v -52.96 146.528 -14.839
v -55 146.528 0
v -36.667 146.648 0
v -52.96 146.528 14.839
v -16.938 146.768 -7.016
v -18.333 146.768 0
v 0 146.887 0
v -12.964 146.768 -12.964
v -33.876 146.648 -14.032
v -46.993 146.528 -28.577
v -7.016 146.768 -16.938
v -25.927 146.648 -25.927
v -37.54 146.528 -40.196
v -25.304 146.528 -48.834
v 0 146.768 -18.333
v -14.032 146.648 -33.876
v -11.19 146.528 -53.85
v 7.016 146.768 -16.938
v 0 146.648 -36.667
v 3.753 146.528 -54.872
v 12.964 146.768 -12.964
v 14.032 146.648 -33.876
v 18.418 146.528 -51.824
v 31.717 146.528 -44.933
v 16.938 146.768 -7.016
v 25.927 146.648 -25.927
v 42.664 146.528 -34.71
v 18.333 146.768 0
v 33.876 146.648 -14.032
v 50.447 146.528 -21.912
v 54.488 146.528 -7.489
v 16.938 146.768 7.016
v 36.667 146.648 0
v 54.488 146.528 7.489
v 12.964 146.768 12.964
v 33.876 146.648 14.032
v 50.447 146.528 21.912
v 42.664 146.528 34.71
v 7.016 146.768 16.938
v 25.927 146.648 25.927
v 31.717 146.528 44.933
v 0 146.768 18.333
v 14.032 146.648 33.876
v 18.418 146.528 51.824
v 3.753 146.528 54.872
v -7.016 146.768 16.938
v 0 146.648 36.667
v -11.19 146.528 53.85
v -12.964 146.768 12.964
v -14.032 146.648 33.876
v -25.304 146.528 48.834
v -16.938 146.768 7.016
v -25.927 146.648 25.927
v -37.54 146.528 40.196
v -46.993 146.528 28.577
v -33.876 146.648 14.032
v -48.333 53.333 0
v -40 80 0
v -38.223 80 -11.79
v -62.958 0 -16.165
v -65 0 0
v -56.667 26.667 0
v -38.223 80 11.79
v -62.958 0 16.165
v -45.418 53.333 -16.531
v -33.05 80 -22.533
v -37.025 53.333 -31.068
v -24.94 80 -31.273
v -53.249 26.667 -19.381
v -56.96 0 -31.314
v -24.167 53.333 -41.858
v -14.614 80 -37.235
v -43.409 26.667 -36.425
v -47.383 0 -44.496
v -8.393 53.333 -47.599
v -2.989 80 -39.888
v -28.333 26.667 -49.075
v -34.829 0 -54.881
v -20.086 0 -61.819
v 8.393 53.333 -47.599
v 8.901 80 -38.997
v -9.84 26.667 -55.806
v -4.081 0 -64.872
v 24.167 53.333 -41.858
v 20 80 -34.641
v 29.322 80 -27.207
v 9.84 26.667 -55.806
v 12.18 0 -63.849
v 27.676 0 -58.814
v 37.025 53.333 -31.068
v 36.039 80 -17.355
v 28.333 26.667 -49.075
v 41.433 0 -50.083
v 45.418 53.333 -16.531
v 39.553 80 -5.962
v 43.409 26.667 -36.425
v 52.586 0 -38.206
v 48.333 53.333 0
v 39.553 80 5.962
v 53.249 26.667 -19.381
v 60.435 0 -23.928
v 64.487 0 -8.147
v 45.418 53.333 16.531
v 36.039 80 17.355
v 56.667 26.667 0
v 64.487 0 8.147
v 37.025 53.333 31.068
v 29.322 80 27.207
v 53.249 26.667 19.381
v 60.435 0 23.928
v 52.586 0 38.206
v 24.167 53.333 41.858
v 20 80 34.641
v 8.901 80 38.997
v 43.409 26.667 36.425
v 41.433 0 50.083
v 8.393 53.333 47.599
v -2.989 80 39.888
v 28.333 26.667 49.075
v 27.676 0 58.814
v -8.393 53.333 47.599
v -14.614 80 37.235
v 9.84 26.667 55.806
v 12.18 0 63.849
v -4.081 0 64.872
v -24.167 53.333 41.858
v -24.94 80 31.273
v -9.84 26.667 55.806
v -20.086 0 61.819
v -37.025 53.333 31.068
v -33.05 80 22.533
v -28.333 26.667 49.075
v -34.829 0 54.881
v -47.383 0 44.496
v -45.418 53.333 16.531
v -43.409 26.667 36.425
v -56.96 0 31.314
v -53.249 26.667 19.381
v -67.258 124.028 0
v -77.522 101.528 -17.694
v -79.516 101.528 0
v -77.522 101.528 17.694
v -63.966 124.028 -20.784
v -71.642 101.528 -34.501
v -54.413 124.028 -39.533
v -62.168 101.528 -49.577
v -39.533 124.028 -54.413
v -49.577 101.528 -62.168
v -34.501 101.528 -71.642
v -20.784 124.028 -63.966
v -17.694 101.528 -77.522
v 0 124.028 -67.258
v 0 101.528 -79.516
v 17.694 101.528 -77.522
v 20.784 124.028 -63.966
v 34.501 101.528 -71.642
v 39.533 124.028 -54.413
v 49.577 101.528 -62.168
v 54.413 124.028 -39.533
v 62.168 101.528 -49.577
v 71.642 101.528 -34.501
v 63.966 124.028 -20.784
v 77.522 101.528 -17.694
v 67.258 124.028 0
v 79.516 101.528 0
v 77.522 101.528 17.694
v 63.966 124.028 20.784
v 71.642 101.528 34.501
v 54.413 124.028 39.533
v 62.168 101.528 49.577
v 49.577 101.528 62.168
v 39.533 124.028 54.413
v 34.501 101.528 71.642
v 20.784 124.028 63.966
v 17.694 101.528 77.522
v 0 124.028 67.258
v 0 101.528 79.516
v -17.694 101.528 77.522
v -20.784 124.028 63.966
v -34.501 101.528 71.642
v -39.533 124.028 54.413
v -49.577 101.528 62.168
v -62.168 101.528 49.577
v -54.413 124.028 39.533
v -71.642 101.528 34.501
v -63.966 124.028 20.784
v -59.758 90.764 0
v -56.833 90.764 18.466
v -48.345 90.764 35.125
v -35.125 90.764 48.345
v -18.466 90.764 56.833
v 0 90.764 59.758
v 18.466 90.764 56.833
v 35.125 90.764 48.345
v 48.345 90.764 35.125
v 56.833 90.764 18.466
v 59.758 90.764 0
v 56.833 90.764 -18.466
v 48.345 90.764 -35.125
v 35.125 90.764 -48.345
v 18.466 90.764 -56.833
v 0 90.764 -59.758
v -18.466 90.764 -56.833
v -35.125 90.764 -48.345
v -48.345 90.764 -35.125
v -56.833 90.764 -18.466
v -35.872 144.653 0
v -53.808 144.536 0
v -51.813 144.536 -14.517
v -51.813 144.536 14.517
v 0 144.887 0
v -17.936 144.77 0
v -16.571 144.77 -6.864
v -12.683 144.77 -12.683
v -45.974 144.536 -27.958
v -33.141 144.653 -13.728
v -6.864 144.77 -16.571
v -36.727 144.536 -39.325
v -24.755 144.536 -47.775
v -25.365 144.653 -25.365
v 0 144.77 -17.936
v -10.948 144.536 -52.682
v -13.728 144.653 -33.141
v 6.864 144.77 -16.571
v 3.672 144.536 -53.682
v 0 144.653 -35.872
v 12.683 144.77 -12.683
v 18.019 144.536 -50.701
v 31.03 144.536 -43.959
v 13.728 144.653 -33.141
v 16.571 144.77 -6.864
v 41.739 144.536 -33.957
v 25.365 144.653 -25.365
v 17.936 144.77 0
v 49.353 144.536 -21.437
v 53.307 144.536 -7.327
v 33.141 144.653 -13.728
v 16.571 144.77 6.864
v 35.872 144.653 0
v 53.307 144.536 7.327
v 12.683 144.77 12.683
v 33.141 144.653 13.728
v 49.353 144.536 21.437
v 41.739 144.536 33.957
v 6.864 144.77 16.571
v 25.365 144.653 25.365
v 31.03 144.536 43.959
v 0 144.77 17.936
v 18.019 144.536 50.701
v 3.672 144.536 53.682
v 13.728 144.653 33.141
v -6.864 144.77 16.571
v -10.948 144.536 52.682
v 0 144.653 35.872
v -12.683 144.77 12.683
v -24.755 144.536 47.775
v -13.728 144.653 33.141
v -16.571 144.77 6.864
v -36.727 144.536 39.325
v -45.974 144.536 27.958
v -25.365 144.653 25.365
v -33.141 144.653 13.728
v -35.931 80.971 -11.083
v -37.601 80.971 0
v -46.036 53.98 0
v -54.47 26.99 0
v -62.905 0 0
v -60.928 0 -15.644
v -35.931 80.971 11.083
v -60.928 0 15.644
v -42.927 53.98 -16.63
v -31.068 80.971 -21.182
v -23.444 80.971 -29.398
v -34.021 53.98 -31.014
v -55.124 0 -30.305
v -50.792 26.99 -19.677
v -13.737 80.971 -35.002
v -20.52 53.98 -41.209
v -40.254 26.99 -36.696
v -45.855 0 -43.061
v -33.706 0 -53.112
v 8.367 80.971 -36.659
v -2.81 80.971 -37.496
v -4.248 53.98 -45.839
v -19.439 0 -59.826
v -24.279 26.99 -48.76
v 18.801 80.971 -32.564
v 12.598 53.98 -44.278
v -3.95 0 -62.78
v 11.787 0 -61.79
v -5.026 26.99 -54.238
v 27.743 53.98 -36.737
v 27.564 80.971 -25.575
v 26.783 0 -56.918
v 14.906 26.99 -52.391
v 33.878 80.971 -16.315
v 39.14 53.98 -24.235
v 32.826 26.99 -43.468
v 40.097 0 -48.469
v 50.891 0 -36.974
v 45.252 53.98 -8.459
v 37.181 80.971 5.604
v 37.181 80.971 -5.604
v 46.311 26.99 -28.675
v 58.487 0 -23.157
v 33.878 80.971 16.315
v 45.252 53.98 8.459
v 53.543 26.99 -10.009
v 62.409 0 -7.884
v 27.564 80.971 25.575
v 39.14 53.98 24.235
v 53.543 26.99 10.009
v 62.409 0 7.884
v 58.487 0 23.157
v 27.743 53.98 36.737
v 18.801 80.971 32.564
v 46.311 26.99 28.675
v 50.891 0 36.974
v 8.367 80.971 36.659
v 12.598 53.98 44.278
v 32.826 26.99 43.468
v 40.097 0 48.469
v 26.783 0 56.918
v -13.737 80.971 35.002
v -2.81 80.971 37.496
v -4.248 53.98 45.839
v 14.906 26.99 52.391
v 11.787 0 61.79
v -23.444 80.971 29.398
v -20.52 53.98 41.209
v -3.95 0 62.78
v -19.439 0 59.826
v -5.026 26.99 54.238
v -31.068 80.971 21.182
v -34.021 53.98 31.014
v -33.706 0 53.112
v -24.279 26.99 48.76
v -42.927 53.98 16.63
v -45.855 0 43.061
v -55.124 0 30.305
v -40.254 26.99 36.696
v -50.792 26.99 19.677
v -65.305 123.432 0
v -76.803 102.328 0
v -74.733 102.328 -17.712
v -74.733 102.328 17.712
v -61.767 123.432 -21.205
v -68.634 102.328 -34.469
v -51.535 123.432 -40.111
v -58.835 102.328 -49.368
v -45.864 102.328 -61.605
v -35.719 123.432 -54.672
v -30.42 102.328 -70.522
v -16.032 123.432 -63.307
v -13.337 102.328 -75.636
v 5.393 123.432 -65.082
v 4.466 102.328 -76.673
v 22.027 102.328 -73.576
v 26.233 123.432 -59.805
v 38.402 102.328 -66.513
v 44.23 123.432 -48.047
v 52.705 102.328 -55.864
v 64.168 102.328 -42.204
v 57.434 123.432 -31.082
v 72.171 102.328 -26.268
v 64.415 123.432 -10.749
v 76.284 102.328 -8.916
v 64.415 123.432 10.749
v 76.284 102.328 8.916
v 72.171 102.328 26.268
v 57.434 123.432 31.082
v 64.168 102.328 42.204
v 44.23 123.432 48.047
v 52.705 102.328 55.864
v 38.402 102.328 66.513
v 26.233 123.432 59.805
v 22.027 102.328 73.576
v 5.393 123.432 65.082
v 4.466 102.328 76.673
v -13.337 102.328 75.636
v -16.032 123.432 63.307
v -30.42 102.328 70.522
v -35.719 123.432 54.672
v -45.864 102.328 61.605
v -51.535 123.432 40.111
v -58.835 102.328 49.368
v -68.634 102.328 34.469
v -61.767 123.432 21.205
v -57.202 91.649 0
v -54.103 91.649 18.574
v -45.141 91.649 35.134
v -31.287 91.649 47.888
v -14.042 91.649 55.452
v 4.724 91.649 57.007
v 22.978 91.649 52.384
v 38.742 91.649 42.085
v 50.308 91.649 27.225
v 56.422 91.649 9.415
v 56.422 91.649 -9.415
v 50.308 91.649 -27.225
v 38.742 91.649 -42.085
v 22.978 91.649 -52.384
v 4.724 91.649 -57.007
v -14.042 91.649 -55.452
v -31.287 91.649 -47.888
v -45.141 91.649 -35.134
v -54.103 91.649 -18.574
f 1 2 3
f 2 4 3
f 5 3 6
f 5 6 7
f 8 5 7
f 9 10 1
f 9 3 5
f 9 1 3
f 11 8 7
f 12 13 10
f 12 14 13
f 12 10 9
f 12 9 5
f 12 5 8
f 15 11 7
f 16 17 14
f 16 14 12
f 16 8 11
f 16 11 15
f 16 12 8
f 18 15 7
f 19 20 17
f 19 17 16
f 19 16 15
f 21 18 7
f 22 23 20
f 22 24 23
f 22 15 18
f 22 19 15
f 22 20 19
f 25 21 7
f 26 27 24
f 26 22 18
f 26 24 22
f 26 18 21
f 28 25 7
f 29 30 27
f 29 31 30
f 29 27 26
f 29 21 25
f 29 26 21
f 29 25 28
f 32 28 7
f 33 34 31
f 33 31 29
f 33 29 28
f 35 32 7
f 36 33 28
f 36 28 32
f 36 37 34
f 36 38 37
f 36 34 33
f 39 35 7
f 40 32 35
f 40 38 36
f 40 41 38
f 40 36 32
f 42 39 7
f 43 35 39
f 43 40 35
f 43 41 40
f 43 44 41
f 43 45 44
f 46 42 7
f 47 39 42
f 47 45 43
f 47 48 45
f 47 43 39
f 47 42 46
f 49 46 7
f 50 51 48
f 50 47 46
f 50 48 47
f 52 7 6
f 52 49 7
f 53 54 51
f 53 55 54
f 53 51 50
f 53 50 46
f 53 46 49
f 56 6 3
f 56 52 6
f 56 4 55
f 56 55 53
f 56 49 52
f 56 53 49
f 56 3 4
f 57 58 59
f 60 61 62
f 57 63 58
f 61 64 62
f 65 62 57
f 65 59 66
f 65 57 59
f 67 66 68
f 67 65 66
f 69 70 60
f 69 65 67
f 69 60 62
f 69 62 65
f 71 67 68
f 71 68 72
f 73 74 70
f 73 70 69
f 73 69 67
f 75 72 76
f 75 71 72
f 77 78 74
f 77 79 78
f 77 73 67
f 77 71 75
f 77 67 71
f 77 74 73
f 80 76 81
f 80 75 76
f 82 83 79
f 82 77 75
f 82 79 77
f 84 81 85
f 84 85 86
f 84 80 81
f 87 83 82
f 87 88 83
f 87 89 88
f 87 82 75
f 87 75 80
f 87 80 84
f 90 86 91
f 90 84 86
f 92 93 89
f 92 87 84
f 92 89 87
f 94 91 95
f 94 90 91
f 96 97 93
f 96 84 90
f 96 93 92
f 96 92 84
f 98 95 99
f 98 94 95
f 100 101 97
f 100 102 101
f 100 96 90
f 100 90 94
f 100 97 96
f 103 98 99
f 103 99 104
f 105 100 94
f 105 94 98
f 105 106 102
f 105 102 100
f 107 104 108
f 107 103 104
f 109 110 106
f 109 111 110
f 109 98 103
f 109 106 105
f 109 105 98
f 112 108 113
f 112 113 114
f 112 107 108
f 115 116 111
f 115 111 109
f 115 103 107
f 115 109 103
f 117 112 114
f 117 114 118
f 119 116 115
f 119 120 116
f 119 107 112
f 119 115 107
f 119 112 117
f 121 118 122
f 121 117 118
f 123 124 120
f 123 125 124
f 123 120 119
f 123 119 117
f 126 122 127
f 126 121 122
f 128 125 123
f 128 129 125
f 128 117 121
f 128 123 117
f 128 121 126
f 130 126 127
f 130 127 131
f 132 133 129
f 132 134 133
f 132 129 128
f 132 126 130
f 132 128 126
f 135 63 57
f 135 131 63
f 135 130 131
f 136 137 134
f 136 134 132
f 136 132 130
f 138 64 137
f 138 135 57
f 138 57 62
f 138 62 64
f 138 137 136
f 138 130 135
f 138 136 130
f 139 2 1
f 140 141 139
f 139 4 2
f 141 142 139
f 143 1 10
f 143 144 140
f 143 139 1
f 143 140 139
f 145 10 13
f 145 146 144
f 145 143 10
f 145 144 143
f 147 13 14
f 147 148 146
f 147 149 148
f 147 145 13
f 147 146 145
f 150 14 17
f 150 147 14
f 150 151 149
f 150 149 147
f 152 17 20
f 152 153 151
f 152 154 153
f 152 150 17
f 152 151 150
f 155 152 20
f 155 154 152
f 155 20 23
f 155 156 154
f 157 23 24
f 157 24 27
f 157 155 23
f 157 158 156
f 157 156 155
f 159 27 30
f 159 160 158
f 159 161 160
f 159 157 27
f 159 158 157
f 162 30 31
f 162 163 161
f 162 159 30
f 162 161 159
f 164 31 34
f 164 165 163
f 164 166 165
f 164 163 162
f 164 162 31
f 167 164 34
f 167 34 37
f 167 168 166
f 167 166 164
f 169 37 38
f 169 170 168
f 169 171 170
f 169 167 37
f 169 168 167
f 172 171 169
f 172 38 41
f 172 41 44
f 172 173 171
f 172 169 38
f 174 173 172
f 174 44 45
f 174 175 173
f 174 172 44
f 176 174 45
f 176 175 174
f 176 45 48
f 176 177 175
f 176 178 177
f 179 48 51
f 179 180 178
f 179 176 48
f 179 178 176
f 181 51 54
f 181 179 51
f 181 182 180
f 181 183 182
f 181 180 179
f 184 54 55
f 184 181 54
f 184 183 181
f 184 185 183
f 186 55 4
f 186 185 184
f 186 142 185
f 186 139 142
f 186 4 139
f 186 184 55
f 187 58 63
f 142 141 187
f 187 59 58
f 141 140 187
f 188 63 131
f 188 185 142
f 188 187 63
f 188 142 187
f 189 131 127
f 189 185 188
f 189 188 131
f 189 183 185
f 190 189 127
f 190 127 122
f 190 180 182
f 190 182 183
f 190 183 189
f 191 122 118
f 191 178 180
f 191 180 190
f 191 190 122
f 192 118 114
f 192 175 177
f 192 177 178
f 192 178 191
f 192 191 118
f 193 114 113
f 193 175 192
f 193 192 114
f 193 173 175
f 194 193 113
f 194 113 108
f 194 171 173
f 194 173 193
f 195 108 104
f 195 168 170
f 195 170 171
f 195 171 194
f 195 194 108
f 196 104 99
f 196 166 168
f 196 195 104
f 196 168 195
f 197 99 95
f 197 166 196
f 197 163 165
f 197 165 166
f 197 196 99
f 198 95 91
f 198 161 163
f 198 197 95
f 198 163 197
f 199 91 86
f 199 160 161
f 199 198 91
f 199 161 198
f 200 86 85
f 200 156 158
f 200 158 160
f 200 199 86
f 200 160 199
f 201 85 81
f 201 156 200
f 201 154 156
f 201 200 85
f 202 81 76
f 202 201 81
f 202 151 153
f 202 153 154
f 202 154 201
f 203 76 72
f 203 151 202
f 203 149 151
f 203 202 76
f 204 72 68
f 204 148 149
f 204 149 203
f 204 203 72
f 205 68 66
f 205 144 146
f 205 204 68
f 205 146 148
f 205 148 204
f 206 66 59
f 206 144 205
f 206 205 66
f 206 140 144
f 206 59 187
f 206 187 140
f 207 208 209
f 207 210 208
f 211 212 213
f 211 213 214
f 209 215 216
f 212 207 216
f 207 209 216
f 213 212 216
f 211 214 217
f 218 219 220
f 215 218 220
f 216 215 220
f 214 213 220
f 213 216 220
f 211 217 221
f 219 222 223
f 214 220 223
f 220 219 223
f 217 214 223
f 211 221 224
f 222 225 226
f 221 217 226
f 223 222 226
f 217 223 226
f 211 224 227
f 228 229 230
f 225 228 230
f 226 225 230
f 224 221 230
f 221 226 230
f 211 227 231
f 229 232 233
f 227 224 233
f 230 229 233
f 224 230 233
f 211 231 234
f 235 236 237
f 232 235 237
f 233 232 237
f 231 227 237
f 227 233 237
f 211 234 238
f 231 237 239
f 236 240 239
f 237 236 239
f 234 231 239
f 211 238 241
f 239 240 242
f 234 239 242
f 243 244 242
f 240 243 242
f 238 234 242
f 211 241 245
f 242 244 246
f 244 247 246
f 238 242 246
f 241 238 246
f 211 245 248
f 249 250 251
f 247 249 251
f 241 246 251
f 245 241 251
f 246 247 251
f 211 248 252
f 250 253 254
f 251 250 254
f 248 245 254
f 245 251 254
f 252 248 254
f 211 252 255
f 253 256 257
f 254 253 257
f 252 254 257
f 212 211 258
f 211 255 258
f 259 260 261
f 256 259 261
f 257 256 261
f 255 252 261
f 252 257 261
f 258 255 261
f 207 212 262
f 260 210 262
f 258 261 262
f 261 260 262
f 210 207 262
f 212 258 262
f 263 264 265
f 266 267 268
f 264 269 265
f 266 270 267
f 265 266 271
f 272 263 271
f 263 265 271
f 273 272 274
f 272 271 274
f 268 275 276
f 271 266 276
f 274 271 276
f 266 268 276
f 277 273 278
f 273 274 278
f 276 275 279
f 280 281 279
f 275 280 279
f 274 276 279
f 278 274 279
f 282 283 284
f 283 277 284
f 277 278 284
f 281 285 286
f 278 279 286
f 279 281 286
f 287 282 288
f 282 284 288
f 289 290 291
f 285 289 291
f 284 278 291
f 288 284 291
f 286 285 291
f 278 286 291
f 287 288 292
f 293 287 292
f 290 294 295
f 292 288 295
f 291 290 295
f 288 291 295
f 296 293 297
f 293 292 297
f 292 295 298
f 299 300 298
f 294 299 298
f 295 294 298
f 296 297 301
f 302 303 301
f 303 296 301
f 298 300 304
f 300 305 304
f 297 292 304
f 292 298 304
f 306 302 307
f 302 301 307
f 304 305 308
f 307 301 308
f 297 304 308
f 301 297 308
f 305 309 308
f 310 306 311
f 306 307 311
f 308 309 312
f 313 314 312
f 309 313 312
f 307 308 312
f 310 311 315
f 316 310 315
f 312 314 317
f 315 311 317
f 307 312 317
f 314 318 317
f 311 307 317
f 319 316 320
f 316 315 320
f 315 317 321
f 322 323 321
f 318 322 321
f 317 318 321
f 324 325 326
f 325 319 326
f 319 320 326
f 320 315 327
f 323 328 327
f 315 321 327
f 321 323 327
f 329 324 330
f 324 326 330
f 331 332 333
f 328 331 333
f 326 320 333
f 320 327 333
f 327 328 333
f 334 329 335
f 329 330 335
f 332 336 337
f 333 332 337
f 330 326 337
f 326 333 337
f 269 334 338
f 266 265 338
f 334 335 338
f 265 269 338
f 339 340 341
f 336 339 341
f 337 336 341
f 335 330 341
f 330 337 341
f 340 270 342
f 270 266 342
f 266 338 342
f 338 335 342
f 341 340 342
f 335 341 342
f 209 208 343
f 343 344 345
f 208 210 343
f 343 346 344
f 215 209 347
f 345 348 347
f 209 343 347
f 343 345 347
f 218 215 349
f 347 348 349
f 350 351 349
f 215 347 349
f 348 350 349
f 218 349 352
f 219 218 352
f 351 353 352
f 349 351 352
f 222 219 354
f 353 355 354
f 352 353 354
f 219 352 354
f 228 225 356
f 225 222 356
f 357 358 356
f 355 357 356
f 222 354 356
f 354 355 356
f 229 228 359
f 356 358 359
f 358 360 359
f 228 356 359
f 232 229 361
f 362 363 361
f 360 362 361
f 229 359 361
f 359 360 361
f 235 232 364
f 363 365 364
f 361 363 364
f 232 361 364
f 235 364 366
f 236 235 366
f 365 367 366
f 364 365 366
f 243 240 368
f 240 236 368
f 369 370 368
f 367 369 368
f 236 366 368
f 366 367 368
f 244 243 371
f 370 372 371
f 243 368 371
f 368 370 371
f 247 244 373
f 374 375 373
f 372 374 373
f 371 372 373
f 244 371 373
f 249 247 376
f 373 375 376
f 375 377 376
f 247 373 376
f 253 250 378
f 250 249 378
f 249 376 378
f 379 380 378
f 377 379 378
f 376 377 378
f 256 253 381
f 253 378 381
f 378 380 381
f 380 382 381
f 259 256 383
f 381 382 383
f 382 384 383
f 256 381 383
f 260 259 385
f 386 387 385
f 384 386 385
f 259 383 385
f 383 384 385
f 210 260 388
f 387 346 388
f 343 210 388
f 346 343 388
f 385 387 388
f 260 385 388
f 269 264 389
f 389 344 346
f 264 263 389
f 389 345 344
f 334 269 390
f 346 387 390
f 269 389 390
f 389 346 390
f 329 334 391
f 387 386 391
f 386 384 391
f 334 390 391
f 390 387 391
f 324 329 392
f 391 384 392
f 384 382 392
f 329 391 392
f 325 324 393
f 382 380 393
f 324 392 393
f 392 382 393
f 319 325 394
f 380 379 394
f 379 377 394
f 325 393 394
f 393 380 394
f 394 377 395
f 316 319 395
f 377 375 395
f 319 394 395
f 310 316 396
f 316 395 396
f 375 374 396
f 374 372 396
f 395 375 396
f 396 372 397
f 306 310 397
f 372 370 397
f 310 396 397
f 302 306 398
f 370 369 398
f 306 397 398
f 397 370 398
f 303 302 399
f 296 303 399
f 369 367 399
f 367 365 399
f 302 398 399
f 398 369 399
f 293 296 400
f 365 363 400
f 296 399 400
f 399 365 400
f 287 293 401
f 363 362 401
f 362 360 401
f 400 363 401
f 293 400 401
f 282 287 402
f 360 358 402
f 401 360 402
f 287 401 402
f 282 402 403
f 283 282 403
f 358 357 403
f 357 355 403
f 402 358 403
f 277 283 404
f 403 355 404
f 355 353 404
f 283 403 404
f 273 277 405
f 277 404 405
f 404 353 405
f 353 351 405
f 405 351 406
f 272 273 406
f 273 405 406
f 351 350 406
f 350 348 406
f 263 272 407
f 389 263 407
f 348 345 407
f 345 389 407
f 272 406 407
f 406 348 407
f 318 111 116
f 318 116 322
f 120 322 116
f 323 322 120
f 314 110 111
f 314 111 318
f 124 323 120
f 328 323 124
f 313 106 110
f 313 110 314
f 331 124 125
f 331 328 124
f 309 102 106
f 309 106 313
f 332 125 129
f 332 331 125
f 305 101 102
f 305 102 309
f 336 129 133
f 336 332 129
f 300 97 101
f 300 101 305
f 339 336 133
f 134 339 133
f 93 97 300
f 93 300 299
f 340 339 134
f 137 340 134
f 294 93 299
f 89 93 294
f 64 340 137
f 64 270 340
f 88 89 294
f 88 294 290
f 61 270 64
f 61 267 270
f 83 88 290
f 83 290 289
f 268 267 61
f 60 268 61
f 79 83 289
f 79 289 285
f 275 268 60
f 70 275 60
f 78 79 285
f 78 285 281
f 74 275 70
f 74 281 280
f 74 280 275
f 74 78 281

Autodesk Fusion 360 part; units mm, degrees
sketch "Esquisse1" plane through (0, 0, 0) normal (0, 0, 1) x (1, 0, 0)
  line L0 (0, 0) -> (-65, 0)
  line L1 (-65, 0) -> (-40, 80)
  line L2 (-40, 80) -> (-79.5161, 101.5285)
  line L3 (-79.5161, 101.5285) -> (-55, 146.5285)
  line L4 (-55, 146.5285) -> (0, 146.8871)
  line L5 (0, 146.8871) -> (0, 0)
  dimension "d1" = 65
  dimension "d2" = 45
  dimension "d3" = 45
  dimension "d4" = 40
  dimension "d5" = 80
  dimension "d6" = 55
revolve "Révolution1" add sketch "Esquisse1" angle 360 about axis through (0, 146.8871, 0) along (0, -1, 0)
shell "Coque1" thickness 2 removed faces 1 at (20.2416, 0, -0.2148)
